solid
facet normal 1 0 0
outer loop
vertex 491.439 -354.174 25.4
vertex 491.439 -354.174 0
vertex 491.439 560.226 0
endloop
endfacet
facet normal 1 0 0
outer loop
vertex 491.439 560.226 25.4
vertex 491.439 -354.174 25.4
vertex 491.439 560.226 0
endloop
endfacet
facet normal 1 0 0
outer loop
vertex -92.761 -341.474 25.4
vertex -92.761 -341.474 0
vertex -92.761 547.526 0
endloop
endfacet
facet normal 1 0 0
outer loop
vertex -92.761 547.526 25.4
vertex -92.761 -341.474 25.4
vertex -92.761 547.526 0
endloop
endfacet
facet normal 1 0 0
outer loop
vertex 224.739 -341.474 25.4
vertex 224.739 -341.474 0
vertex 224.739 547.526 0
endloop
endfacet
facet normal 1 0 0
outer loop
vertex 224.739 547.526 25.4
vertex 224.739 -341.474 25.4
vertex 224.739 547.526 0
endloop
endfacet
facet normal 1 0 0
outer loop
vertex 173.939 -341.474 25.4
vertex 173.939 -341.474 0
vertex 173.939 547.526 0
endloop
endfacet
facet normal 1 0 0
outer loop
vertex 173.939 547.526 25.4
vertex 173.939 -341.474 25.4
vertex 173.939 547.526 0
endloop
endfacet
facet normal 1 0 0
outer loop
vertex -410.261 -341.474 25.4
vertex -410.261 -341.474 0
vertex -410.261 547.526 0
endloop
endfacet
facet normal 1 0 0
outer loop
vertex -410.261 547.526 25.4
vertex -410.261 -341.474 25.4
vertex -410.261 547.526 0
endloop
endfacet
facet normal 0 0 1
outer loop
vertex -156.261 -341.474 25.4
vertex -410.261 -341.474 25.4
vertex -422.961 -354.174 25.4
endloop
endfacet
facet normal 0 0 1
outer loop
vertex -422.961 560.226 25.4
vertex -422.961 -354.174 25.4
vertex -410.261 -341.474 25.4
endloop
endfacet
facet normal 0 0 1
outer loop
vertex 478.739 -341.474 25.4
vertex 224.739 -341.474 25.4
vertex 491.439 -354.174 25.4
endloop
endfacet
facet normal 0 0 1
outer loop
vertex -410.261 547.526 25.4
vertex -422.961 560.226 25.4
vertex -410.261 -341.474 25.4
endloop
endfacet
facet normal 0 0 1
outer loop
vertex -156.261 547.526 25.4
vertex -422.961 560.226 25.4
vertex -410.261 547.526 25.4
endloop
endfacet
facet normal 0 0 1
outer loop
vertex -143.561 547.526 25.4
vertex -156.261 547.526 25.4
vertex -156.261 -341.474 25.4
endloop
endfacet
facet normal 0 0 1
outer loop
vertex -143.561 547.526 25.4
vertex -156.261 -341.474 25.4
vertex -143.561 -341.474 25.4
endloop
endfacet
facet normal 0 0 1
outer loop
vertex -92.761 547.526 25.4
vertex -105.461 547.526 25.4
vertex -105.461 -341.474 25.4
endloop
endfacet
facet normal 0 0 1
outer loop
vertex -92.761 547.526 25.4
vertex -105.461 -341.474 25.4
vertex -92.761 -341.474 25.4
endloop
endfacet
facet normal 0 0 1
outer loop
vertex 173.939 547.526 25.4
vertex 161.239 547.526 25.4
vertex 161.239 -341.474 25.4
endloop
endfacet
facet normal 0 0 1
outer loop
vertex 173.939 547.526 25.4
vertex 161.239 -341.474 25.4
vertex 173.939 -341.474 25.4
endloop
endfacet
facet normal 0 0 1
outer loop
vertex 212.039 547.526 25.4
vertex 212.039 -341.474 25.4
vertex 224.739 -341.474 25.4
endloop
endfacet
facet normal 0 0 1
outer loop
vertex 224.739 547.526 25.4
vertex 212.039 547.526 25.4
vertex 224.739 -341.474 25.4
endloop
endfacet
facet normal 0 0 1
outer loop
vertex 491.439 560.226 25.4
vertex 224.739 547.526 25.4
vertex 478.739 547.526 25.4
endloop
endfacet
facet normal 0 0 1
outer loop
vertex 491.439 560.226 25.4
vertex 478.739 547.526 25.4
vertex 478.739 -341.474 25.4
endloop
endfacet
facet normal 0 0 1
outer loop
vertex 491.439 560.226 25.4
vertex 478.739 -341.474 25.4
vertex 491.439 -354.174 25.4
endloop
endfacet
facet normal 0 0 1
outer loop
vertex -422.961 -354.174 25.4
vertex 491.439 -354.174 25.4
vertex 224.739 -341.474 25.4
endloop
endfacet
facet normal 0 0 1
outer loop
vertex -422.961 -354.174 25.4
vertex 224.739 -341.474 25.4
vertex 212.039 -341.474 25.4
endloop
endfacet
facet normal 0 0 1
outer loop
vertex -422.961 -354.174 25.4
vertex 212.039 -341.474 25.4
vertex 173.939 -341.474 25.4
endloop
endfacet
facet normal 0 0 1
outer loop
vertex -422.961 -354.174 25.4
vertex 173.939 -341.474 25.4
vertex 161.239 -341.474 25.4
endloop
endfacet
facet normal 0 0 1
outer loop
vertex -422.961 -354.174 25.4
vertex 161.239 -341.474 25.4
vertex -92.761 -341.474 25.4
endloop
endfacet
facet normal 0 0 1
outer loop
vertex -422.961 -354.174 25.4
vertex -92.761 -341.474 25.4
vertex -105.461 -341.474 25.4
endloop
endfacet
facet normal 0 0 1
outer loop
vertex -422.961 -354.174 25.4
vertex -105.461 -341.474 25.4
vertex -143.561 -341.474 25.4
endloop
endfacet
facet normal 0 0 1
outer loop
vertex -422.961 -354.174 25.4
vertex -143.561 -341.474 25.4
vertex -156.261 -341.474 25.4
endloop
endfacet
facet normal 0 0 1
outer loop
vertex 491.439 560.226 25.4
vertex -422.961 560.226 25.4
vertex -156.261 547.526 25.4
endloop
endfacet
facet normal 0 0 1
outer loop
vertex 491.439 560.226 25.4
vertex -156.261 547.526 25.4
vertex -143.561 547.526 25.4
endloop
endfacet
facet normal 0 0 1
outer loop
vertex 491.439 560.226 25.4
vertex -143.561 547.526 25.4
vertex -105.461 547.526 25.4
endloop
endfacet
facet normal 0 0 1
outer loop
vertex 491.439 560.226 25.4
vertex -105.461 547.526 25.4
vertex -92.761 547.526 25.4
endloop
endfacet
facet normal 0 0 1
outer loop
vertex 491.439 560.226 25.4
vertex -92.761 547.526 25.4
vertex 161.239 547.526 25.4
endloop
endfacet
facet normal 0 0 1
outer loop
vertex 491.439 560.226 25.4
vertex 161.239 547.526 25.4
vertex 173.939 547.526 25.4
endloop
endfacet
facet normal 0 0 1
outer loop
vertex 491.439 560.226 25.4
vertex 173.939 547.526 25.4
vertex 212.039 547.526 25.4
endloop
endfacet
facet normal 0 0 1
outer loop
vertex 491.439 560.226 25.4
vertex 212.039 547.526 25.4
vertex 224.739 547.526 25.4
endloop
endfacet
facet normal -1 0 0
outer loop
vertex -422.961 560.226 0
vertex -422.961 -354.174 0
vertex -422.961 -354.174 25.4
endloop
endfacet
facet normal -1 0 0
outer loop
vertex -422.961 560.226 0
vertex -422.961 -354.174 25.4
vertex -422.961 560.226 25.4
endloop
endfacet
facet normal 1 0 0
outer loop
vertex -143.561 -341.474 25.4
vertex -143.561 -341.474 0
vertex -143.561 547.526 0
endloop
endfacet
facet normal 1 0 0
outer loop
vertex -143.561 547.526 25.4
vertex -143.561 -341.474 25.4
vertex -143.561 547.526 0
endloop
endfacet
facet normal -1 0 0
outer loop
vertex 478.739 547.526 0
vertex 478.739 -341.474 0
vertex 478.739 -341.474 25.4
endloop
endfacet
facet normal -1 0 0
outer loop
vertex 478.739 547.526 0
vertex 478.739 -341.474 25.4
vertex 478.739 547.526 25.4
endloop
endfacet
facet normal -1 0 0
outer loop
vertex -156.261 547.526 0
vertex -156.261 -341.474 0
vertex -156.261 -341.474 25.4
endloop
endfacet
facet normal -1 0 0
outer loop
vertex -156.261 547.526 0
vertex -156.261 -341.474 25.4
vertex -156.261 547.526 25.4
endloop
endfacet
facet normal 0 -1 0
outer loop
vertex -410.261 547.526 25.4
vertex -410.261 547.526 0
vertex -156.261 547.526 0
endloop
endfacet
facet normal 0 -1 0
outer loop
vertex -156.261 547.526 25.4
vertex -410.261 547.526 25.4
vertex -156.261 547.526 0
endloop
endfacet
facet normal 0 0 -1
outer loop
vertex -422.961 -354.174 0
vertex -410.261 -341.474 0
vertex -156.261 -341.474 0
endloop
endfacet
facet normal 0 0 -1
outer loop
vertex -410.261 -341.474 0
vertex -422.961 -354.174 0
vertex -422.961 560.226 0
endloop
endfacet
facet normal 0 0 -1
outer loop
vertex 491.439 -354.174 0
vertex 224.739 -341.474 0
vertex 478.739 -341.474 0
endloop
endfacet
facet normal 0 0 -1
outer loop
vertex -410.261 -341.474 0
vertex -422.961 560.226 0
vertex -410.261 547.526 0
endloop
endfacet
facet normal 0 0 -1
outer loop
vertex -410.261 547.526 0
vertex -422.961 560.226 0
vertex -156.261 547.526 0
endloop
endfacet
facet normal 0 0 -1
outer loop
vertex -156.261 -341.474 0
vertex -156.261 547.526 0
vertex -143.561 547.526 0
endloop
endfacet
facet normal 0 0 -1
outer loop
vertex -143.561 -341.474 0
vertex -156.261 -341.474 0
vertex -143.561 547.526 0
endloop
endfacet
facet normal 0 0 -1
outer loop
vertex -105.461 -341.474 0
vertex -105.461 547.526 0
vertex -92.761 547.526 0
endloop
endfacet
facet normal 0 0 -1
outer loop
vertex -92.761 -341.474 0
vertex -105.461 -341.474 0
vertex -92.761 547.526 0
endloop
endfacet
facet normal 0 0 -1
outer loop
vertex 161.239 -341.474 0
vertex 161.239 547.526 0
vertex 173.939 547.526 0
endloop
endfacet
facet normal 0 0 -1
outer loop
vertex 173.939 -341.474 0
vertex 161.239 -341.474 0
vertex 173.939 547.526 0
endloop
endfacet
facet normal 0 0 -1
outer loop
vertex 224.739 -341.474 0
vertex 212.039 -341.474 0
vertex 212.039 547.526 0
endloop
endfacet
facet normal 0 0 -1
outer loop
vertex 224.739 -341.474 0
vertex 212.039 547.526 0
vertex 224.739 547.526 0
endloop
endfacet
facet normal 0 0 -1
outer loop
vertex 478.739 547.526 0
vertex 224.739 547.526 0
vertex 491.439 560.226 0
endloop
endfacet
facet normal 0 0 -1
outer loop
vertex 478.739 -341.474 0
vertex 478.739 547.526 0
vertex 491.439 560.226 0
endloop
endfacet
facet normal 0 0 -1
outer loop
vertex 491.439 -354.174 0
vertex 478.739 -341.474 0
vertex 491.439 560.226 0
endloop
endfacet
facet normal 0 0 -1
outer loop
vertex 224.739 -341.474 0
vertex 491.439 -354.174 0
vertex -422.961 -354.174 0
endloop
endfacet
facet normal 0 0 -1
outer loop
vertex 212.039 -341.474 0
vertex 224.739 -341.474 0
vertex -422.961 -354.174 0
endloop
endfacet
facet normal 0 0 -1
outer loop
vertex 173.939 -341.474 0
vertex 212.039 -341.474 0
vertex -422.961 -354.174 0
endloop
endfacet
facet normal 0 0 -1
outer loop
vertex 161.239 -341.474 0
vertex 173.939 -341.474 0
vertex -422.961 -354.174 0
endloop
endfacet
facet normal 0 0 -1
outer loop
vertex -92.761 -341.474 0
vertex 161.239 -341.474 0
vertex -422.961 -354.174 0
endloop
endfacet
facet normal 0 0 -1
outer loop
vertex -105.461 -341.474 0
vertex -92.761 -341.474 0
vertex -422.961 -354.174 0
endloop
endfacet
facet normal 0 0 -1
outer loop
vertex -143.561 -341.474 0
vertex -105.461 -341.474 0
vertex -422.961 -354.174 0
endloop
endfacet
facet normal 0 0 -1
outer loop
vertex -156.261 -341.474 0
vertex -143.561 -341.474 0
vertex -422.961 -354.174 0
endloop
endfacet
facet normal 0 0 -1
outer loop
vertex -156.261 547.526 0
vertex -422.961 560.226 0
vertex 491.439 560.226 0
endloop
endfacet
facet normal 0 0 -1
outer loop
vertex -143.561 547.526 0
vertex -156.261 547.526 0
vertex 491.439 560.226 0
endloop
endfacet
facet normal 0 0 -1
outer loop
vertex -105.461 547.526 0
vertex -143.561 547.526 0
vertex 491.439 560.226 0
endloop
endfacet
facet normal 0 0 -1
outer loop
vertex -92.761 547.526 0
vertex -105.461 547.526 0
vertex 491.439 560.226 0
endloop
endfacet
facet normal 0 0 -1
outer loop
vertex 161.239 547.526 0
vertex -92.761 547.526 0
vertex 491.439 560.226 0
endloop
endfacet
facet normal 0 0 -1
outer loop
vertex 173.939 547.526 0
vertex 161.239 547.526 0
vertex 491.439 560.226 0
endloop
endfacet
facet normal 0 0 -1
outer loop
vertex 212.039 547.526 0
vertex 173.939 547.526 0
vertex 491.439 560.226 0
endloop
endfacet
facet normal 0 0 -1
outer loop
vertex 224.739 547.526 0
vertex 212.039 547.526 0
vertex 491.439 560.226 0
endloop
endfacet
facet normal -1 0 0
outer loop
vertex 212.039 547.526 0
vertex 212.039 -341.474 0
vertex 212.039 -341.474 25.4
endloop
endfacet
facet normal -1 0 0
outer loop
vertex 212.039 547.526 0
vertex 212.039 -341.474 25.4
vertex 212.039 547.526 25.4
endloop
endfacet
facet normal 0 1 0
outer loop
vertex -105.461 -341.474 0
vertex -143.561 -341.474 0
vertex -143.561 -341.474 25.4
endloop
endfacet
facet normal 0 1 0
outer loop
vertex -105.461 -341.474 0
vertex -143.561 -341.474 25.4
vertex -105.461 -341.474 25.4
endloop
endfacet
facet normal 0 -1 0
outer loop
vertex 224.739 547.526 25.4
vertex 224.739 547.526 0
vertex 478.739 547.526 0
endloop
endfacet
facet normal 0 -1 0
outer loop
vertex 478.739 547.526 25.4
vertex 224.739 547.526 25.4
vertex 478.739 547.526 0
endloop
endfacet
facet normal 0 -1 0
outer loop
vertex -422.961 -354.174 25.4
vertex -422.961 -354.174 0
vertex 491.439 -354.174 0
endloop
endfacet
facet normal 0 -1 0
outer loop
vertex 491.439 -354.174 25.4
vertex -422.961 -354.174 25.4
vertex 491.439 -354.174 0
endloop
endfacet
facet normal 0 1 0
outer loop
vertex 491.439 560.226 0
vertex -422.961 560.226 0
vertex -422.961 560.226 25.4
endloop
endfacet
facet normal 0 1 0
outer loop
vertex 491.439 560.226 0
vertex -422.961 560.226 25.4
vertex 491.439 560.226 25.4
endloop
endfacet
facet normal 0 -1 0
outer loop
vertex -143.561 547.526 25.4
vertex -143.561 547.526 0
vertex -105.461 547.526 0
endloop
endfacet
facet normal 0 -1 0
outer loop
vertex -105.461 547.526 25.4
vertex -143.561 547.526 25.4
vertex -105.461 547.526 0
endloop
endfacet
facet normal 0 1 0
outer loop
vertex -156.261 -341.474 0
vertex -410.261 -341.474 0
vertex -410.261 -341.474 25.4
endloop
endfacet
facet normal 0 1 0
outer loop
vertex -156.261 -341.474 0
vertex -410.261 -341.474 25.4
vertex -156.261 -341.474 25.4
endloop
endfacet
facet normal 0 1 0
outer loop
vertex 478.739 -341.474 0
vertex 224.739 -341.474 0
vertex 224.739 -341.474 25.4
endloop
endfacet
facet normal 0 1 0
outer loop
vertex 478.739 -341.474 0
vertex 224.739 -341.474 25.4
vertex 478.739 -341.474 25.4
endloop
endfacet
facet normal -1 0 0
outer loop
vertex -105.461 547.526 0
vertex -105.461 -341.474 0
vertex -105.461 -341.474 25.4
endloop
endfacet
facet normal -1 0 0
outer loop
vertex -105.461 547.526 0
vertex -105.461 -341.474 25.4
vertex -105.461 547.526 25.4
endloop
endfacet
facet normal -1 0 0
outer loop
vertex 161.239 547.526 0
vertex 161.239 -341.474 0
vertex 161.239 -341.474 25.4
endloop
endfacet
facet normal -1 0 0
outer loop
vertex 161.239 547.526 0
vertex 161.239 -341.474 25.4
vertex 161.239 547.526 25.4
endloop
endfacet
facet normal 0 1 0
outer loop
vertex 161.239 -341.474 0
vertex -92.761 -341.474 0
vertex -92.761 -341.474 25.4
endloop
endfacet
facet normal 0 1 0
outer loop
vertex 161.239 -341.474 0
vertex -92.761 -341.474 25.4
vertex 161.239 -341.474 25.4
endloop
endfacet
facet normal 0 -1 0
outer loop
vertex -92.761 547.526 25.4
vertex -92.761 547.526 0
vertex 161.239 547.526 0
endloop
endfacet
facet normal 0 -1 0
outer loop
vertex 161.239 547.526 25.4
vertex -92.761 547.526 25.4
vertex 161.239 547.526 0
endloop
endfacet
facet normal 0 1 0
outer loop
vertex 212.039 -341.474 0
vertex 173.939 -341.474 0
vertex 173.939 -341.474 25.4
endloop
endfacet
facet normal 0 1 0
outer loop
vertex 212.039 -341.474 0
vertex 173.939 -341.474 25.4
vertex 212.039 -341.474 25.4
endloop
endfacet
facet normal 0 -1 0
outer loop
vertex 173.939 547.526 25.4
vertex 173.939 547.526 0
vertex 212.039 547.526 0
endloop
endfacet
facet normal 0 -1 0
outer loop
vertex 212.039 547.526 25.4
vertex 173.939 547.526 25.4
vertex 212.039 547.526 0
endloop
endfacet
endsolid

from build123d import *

# Parameters (mm, degrees)
F0_W     = 914.4
F0_H     = 914.4
F0_W_2   = 254
F0_H_2   = 889
F0_W_3   = 38.1
F1_DEPTH = 25.4


with BuildPart() as f1:
    # F0 (on Top) → F1 (new body)
    with BuildSketch(Plane.XY):
        with Locations((34.239113, 103.026486)):
            Rectangle(F0_W, F0_H)
        with Locations((-283.260887, 103.026486)):
            Rectangle(F0_W_2, F0_H_2, mode=Mode.SUBTRACT)
        with Locations((-124.510887, 103.026486)):
            Rectangle(F0_W_3, F0_H_2, mode=Mode.SUBTRACT)
        with Locations((34.239113, 103.026486)):
            Rectangle(F0_W_2, F0_H_2, mode=Mode.SUBTRACT)
        with Locations((192.989113, 103.026486)):
            Rectangle(F0_W_3, F0_H_2, mode=Mode.SUBTRACT)
        with Locations((351.739113, 103.026486)):
            Rectangle(F0_W_2, F0_H_2, mode=Mode.SUBTRACT)
    extrude(amount=F1_DEPTH)


solid = f1.part
